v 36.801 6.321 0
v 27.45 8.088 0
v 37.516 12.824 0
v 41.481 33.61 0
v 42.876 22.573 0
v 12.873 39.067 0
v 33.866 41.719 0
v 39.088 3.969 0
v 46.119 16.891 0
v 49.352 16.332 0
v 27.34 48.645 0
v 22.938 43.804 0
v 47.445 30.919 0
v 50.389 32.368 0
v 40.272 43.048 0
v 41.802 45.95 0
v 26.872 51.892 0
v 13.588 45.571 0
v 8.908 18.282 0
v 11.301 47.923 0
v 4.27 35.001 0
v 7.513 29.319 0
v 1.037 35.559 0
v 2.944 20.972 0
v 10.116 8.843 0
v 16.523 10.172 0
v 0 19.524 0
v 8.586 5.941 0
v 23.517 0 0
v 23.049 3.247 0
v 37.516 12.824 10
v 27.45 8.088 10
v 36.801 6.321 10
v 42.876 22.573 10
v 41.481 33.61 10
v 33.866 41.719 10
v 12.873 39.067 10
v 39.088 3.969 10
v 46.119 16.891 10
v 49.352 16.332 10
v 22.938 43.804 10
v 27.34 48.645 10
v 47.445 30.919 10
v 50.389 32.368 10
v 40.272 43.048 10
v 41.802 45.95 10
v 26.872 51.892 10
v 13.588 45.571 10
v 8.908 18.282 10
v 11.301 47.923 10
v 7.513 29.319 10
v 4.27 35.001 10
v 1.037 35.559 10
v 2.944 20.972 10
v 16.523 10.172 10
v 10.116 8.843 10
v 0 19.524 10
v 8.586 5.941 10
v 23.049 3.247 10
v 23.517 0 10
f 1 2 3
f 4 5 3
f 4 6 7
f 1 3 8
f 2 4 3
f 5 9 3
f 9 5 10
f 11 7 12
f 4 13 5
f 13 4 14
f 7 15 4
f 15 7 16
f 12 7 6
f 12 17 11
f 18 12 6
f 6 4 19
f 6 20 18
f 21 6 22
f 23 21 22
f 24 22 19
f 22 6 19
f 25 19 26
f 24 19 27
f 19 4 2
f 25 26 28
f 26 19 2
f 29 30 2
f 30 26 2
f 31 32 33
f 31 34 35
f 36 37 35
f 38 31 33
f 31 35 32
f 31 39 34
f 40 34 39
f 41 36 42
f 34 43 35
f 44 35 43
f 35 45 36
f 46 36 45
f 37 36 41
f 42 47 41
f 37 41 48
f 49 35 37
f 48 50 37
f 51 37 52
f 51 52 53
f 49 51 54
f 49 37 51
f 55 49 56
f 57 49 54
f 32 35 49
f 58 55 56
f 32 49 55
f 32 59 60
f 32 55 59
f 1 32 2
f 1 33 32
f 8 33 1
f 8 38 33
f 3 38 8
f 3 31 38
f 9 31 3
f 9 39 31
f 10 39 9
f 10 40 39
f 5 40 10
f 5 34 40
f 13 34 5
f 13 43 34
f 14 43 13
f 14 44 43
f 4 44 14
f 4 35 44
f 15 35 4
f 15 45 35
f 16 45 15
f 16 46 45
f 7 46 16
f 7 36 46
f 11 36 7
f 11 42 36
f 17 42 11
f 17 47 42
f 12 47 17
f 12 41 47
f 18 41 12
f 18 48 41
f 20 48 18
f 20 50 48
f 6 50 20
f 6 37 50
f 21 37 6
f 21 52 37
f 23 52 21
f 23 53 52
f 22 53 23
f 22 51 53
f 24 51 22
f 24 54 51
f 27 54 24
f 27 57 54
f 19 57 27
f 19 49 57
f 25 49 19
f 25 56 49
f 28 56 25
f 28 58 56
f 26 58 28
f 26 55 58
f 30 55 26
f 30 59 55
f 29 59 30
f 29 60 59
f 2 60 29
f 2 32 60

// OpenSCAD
$fn = 32;

// ----------------------------------------------------------------------
// Fan rotor section: 10 blades, 18 mm hub radius, 8 mm blades
// ----------------------------------------------------------------------

// --- parameters (mm) ---
profile_height = 10;      // extrusion height
profile_points = 30;      // points of the closed outline

profile = [[42.876, 22.573], [47.445, 30.919], [50.389, 32.368], [41.481, 33.61], [40.272, 43.048], [41.802, 45.95], [33.866, 41.719], [27.34, 48.645], [26.872, 51.892], [22.938, 43.804], [13.588, 45.571], [11.301, 47.923], [12.873, 39.067], [4.27, 35.001], [1.037, 35.559], [7.513, 29.319], [2.944, 20.972], [0, 19.524], [8.908, 18.282], [10.116, 8.843], [8.586, 5.941], [16.523, 10.172], [23.049, 3.247], [23.517, 0], [27.45, 8.088], [36.801, 6.321], [39.088, 3.969], [37.516, 12.824], [46.119, 16.891], [49.352, 16.332]];  // single closed polygon, 30 points, counter clockwise

// --- the one profile operation ---
linear_extrude(height = profile_height) polygon(points = profile);
